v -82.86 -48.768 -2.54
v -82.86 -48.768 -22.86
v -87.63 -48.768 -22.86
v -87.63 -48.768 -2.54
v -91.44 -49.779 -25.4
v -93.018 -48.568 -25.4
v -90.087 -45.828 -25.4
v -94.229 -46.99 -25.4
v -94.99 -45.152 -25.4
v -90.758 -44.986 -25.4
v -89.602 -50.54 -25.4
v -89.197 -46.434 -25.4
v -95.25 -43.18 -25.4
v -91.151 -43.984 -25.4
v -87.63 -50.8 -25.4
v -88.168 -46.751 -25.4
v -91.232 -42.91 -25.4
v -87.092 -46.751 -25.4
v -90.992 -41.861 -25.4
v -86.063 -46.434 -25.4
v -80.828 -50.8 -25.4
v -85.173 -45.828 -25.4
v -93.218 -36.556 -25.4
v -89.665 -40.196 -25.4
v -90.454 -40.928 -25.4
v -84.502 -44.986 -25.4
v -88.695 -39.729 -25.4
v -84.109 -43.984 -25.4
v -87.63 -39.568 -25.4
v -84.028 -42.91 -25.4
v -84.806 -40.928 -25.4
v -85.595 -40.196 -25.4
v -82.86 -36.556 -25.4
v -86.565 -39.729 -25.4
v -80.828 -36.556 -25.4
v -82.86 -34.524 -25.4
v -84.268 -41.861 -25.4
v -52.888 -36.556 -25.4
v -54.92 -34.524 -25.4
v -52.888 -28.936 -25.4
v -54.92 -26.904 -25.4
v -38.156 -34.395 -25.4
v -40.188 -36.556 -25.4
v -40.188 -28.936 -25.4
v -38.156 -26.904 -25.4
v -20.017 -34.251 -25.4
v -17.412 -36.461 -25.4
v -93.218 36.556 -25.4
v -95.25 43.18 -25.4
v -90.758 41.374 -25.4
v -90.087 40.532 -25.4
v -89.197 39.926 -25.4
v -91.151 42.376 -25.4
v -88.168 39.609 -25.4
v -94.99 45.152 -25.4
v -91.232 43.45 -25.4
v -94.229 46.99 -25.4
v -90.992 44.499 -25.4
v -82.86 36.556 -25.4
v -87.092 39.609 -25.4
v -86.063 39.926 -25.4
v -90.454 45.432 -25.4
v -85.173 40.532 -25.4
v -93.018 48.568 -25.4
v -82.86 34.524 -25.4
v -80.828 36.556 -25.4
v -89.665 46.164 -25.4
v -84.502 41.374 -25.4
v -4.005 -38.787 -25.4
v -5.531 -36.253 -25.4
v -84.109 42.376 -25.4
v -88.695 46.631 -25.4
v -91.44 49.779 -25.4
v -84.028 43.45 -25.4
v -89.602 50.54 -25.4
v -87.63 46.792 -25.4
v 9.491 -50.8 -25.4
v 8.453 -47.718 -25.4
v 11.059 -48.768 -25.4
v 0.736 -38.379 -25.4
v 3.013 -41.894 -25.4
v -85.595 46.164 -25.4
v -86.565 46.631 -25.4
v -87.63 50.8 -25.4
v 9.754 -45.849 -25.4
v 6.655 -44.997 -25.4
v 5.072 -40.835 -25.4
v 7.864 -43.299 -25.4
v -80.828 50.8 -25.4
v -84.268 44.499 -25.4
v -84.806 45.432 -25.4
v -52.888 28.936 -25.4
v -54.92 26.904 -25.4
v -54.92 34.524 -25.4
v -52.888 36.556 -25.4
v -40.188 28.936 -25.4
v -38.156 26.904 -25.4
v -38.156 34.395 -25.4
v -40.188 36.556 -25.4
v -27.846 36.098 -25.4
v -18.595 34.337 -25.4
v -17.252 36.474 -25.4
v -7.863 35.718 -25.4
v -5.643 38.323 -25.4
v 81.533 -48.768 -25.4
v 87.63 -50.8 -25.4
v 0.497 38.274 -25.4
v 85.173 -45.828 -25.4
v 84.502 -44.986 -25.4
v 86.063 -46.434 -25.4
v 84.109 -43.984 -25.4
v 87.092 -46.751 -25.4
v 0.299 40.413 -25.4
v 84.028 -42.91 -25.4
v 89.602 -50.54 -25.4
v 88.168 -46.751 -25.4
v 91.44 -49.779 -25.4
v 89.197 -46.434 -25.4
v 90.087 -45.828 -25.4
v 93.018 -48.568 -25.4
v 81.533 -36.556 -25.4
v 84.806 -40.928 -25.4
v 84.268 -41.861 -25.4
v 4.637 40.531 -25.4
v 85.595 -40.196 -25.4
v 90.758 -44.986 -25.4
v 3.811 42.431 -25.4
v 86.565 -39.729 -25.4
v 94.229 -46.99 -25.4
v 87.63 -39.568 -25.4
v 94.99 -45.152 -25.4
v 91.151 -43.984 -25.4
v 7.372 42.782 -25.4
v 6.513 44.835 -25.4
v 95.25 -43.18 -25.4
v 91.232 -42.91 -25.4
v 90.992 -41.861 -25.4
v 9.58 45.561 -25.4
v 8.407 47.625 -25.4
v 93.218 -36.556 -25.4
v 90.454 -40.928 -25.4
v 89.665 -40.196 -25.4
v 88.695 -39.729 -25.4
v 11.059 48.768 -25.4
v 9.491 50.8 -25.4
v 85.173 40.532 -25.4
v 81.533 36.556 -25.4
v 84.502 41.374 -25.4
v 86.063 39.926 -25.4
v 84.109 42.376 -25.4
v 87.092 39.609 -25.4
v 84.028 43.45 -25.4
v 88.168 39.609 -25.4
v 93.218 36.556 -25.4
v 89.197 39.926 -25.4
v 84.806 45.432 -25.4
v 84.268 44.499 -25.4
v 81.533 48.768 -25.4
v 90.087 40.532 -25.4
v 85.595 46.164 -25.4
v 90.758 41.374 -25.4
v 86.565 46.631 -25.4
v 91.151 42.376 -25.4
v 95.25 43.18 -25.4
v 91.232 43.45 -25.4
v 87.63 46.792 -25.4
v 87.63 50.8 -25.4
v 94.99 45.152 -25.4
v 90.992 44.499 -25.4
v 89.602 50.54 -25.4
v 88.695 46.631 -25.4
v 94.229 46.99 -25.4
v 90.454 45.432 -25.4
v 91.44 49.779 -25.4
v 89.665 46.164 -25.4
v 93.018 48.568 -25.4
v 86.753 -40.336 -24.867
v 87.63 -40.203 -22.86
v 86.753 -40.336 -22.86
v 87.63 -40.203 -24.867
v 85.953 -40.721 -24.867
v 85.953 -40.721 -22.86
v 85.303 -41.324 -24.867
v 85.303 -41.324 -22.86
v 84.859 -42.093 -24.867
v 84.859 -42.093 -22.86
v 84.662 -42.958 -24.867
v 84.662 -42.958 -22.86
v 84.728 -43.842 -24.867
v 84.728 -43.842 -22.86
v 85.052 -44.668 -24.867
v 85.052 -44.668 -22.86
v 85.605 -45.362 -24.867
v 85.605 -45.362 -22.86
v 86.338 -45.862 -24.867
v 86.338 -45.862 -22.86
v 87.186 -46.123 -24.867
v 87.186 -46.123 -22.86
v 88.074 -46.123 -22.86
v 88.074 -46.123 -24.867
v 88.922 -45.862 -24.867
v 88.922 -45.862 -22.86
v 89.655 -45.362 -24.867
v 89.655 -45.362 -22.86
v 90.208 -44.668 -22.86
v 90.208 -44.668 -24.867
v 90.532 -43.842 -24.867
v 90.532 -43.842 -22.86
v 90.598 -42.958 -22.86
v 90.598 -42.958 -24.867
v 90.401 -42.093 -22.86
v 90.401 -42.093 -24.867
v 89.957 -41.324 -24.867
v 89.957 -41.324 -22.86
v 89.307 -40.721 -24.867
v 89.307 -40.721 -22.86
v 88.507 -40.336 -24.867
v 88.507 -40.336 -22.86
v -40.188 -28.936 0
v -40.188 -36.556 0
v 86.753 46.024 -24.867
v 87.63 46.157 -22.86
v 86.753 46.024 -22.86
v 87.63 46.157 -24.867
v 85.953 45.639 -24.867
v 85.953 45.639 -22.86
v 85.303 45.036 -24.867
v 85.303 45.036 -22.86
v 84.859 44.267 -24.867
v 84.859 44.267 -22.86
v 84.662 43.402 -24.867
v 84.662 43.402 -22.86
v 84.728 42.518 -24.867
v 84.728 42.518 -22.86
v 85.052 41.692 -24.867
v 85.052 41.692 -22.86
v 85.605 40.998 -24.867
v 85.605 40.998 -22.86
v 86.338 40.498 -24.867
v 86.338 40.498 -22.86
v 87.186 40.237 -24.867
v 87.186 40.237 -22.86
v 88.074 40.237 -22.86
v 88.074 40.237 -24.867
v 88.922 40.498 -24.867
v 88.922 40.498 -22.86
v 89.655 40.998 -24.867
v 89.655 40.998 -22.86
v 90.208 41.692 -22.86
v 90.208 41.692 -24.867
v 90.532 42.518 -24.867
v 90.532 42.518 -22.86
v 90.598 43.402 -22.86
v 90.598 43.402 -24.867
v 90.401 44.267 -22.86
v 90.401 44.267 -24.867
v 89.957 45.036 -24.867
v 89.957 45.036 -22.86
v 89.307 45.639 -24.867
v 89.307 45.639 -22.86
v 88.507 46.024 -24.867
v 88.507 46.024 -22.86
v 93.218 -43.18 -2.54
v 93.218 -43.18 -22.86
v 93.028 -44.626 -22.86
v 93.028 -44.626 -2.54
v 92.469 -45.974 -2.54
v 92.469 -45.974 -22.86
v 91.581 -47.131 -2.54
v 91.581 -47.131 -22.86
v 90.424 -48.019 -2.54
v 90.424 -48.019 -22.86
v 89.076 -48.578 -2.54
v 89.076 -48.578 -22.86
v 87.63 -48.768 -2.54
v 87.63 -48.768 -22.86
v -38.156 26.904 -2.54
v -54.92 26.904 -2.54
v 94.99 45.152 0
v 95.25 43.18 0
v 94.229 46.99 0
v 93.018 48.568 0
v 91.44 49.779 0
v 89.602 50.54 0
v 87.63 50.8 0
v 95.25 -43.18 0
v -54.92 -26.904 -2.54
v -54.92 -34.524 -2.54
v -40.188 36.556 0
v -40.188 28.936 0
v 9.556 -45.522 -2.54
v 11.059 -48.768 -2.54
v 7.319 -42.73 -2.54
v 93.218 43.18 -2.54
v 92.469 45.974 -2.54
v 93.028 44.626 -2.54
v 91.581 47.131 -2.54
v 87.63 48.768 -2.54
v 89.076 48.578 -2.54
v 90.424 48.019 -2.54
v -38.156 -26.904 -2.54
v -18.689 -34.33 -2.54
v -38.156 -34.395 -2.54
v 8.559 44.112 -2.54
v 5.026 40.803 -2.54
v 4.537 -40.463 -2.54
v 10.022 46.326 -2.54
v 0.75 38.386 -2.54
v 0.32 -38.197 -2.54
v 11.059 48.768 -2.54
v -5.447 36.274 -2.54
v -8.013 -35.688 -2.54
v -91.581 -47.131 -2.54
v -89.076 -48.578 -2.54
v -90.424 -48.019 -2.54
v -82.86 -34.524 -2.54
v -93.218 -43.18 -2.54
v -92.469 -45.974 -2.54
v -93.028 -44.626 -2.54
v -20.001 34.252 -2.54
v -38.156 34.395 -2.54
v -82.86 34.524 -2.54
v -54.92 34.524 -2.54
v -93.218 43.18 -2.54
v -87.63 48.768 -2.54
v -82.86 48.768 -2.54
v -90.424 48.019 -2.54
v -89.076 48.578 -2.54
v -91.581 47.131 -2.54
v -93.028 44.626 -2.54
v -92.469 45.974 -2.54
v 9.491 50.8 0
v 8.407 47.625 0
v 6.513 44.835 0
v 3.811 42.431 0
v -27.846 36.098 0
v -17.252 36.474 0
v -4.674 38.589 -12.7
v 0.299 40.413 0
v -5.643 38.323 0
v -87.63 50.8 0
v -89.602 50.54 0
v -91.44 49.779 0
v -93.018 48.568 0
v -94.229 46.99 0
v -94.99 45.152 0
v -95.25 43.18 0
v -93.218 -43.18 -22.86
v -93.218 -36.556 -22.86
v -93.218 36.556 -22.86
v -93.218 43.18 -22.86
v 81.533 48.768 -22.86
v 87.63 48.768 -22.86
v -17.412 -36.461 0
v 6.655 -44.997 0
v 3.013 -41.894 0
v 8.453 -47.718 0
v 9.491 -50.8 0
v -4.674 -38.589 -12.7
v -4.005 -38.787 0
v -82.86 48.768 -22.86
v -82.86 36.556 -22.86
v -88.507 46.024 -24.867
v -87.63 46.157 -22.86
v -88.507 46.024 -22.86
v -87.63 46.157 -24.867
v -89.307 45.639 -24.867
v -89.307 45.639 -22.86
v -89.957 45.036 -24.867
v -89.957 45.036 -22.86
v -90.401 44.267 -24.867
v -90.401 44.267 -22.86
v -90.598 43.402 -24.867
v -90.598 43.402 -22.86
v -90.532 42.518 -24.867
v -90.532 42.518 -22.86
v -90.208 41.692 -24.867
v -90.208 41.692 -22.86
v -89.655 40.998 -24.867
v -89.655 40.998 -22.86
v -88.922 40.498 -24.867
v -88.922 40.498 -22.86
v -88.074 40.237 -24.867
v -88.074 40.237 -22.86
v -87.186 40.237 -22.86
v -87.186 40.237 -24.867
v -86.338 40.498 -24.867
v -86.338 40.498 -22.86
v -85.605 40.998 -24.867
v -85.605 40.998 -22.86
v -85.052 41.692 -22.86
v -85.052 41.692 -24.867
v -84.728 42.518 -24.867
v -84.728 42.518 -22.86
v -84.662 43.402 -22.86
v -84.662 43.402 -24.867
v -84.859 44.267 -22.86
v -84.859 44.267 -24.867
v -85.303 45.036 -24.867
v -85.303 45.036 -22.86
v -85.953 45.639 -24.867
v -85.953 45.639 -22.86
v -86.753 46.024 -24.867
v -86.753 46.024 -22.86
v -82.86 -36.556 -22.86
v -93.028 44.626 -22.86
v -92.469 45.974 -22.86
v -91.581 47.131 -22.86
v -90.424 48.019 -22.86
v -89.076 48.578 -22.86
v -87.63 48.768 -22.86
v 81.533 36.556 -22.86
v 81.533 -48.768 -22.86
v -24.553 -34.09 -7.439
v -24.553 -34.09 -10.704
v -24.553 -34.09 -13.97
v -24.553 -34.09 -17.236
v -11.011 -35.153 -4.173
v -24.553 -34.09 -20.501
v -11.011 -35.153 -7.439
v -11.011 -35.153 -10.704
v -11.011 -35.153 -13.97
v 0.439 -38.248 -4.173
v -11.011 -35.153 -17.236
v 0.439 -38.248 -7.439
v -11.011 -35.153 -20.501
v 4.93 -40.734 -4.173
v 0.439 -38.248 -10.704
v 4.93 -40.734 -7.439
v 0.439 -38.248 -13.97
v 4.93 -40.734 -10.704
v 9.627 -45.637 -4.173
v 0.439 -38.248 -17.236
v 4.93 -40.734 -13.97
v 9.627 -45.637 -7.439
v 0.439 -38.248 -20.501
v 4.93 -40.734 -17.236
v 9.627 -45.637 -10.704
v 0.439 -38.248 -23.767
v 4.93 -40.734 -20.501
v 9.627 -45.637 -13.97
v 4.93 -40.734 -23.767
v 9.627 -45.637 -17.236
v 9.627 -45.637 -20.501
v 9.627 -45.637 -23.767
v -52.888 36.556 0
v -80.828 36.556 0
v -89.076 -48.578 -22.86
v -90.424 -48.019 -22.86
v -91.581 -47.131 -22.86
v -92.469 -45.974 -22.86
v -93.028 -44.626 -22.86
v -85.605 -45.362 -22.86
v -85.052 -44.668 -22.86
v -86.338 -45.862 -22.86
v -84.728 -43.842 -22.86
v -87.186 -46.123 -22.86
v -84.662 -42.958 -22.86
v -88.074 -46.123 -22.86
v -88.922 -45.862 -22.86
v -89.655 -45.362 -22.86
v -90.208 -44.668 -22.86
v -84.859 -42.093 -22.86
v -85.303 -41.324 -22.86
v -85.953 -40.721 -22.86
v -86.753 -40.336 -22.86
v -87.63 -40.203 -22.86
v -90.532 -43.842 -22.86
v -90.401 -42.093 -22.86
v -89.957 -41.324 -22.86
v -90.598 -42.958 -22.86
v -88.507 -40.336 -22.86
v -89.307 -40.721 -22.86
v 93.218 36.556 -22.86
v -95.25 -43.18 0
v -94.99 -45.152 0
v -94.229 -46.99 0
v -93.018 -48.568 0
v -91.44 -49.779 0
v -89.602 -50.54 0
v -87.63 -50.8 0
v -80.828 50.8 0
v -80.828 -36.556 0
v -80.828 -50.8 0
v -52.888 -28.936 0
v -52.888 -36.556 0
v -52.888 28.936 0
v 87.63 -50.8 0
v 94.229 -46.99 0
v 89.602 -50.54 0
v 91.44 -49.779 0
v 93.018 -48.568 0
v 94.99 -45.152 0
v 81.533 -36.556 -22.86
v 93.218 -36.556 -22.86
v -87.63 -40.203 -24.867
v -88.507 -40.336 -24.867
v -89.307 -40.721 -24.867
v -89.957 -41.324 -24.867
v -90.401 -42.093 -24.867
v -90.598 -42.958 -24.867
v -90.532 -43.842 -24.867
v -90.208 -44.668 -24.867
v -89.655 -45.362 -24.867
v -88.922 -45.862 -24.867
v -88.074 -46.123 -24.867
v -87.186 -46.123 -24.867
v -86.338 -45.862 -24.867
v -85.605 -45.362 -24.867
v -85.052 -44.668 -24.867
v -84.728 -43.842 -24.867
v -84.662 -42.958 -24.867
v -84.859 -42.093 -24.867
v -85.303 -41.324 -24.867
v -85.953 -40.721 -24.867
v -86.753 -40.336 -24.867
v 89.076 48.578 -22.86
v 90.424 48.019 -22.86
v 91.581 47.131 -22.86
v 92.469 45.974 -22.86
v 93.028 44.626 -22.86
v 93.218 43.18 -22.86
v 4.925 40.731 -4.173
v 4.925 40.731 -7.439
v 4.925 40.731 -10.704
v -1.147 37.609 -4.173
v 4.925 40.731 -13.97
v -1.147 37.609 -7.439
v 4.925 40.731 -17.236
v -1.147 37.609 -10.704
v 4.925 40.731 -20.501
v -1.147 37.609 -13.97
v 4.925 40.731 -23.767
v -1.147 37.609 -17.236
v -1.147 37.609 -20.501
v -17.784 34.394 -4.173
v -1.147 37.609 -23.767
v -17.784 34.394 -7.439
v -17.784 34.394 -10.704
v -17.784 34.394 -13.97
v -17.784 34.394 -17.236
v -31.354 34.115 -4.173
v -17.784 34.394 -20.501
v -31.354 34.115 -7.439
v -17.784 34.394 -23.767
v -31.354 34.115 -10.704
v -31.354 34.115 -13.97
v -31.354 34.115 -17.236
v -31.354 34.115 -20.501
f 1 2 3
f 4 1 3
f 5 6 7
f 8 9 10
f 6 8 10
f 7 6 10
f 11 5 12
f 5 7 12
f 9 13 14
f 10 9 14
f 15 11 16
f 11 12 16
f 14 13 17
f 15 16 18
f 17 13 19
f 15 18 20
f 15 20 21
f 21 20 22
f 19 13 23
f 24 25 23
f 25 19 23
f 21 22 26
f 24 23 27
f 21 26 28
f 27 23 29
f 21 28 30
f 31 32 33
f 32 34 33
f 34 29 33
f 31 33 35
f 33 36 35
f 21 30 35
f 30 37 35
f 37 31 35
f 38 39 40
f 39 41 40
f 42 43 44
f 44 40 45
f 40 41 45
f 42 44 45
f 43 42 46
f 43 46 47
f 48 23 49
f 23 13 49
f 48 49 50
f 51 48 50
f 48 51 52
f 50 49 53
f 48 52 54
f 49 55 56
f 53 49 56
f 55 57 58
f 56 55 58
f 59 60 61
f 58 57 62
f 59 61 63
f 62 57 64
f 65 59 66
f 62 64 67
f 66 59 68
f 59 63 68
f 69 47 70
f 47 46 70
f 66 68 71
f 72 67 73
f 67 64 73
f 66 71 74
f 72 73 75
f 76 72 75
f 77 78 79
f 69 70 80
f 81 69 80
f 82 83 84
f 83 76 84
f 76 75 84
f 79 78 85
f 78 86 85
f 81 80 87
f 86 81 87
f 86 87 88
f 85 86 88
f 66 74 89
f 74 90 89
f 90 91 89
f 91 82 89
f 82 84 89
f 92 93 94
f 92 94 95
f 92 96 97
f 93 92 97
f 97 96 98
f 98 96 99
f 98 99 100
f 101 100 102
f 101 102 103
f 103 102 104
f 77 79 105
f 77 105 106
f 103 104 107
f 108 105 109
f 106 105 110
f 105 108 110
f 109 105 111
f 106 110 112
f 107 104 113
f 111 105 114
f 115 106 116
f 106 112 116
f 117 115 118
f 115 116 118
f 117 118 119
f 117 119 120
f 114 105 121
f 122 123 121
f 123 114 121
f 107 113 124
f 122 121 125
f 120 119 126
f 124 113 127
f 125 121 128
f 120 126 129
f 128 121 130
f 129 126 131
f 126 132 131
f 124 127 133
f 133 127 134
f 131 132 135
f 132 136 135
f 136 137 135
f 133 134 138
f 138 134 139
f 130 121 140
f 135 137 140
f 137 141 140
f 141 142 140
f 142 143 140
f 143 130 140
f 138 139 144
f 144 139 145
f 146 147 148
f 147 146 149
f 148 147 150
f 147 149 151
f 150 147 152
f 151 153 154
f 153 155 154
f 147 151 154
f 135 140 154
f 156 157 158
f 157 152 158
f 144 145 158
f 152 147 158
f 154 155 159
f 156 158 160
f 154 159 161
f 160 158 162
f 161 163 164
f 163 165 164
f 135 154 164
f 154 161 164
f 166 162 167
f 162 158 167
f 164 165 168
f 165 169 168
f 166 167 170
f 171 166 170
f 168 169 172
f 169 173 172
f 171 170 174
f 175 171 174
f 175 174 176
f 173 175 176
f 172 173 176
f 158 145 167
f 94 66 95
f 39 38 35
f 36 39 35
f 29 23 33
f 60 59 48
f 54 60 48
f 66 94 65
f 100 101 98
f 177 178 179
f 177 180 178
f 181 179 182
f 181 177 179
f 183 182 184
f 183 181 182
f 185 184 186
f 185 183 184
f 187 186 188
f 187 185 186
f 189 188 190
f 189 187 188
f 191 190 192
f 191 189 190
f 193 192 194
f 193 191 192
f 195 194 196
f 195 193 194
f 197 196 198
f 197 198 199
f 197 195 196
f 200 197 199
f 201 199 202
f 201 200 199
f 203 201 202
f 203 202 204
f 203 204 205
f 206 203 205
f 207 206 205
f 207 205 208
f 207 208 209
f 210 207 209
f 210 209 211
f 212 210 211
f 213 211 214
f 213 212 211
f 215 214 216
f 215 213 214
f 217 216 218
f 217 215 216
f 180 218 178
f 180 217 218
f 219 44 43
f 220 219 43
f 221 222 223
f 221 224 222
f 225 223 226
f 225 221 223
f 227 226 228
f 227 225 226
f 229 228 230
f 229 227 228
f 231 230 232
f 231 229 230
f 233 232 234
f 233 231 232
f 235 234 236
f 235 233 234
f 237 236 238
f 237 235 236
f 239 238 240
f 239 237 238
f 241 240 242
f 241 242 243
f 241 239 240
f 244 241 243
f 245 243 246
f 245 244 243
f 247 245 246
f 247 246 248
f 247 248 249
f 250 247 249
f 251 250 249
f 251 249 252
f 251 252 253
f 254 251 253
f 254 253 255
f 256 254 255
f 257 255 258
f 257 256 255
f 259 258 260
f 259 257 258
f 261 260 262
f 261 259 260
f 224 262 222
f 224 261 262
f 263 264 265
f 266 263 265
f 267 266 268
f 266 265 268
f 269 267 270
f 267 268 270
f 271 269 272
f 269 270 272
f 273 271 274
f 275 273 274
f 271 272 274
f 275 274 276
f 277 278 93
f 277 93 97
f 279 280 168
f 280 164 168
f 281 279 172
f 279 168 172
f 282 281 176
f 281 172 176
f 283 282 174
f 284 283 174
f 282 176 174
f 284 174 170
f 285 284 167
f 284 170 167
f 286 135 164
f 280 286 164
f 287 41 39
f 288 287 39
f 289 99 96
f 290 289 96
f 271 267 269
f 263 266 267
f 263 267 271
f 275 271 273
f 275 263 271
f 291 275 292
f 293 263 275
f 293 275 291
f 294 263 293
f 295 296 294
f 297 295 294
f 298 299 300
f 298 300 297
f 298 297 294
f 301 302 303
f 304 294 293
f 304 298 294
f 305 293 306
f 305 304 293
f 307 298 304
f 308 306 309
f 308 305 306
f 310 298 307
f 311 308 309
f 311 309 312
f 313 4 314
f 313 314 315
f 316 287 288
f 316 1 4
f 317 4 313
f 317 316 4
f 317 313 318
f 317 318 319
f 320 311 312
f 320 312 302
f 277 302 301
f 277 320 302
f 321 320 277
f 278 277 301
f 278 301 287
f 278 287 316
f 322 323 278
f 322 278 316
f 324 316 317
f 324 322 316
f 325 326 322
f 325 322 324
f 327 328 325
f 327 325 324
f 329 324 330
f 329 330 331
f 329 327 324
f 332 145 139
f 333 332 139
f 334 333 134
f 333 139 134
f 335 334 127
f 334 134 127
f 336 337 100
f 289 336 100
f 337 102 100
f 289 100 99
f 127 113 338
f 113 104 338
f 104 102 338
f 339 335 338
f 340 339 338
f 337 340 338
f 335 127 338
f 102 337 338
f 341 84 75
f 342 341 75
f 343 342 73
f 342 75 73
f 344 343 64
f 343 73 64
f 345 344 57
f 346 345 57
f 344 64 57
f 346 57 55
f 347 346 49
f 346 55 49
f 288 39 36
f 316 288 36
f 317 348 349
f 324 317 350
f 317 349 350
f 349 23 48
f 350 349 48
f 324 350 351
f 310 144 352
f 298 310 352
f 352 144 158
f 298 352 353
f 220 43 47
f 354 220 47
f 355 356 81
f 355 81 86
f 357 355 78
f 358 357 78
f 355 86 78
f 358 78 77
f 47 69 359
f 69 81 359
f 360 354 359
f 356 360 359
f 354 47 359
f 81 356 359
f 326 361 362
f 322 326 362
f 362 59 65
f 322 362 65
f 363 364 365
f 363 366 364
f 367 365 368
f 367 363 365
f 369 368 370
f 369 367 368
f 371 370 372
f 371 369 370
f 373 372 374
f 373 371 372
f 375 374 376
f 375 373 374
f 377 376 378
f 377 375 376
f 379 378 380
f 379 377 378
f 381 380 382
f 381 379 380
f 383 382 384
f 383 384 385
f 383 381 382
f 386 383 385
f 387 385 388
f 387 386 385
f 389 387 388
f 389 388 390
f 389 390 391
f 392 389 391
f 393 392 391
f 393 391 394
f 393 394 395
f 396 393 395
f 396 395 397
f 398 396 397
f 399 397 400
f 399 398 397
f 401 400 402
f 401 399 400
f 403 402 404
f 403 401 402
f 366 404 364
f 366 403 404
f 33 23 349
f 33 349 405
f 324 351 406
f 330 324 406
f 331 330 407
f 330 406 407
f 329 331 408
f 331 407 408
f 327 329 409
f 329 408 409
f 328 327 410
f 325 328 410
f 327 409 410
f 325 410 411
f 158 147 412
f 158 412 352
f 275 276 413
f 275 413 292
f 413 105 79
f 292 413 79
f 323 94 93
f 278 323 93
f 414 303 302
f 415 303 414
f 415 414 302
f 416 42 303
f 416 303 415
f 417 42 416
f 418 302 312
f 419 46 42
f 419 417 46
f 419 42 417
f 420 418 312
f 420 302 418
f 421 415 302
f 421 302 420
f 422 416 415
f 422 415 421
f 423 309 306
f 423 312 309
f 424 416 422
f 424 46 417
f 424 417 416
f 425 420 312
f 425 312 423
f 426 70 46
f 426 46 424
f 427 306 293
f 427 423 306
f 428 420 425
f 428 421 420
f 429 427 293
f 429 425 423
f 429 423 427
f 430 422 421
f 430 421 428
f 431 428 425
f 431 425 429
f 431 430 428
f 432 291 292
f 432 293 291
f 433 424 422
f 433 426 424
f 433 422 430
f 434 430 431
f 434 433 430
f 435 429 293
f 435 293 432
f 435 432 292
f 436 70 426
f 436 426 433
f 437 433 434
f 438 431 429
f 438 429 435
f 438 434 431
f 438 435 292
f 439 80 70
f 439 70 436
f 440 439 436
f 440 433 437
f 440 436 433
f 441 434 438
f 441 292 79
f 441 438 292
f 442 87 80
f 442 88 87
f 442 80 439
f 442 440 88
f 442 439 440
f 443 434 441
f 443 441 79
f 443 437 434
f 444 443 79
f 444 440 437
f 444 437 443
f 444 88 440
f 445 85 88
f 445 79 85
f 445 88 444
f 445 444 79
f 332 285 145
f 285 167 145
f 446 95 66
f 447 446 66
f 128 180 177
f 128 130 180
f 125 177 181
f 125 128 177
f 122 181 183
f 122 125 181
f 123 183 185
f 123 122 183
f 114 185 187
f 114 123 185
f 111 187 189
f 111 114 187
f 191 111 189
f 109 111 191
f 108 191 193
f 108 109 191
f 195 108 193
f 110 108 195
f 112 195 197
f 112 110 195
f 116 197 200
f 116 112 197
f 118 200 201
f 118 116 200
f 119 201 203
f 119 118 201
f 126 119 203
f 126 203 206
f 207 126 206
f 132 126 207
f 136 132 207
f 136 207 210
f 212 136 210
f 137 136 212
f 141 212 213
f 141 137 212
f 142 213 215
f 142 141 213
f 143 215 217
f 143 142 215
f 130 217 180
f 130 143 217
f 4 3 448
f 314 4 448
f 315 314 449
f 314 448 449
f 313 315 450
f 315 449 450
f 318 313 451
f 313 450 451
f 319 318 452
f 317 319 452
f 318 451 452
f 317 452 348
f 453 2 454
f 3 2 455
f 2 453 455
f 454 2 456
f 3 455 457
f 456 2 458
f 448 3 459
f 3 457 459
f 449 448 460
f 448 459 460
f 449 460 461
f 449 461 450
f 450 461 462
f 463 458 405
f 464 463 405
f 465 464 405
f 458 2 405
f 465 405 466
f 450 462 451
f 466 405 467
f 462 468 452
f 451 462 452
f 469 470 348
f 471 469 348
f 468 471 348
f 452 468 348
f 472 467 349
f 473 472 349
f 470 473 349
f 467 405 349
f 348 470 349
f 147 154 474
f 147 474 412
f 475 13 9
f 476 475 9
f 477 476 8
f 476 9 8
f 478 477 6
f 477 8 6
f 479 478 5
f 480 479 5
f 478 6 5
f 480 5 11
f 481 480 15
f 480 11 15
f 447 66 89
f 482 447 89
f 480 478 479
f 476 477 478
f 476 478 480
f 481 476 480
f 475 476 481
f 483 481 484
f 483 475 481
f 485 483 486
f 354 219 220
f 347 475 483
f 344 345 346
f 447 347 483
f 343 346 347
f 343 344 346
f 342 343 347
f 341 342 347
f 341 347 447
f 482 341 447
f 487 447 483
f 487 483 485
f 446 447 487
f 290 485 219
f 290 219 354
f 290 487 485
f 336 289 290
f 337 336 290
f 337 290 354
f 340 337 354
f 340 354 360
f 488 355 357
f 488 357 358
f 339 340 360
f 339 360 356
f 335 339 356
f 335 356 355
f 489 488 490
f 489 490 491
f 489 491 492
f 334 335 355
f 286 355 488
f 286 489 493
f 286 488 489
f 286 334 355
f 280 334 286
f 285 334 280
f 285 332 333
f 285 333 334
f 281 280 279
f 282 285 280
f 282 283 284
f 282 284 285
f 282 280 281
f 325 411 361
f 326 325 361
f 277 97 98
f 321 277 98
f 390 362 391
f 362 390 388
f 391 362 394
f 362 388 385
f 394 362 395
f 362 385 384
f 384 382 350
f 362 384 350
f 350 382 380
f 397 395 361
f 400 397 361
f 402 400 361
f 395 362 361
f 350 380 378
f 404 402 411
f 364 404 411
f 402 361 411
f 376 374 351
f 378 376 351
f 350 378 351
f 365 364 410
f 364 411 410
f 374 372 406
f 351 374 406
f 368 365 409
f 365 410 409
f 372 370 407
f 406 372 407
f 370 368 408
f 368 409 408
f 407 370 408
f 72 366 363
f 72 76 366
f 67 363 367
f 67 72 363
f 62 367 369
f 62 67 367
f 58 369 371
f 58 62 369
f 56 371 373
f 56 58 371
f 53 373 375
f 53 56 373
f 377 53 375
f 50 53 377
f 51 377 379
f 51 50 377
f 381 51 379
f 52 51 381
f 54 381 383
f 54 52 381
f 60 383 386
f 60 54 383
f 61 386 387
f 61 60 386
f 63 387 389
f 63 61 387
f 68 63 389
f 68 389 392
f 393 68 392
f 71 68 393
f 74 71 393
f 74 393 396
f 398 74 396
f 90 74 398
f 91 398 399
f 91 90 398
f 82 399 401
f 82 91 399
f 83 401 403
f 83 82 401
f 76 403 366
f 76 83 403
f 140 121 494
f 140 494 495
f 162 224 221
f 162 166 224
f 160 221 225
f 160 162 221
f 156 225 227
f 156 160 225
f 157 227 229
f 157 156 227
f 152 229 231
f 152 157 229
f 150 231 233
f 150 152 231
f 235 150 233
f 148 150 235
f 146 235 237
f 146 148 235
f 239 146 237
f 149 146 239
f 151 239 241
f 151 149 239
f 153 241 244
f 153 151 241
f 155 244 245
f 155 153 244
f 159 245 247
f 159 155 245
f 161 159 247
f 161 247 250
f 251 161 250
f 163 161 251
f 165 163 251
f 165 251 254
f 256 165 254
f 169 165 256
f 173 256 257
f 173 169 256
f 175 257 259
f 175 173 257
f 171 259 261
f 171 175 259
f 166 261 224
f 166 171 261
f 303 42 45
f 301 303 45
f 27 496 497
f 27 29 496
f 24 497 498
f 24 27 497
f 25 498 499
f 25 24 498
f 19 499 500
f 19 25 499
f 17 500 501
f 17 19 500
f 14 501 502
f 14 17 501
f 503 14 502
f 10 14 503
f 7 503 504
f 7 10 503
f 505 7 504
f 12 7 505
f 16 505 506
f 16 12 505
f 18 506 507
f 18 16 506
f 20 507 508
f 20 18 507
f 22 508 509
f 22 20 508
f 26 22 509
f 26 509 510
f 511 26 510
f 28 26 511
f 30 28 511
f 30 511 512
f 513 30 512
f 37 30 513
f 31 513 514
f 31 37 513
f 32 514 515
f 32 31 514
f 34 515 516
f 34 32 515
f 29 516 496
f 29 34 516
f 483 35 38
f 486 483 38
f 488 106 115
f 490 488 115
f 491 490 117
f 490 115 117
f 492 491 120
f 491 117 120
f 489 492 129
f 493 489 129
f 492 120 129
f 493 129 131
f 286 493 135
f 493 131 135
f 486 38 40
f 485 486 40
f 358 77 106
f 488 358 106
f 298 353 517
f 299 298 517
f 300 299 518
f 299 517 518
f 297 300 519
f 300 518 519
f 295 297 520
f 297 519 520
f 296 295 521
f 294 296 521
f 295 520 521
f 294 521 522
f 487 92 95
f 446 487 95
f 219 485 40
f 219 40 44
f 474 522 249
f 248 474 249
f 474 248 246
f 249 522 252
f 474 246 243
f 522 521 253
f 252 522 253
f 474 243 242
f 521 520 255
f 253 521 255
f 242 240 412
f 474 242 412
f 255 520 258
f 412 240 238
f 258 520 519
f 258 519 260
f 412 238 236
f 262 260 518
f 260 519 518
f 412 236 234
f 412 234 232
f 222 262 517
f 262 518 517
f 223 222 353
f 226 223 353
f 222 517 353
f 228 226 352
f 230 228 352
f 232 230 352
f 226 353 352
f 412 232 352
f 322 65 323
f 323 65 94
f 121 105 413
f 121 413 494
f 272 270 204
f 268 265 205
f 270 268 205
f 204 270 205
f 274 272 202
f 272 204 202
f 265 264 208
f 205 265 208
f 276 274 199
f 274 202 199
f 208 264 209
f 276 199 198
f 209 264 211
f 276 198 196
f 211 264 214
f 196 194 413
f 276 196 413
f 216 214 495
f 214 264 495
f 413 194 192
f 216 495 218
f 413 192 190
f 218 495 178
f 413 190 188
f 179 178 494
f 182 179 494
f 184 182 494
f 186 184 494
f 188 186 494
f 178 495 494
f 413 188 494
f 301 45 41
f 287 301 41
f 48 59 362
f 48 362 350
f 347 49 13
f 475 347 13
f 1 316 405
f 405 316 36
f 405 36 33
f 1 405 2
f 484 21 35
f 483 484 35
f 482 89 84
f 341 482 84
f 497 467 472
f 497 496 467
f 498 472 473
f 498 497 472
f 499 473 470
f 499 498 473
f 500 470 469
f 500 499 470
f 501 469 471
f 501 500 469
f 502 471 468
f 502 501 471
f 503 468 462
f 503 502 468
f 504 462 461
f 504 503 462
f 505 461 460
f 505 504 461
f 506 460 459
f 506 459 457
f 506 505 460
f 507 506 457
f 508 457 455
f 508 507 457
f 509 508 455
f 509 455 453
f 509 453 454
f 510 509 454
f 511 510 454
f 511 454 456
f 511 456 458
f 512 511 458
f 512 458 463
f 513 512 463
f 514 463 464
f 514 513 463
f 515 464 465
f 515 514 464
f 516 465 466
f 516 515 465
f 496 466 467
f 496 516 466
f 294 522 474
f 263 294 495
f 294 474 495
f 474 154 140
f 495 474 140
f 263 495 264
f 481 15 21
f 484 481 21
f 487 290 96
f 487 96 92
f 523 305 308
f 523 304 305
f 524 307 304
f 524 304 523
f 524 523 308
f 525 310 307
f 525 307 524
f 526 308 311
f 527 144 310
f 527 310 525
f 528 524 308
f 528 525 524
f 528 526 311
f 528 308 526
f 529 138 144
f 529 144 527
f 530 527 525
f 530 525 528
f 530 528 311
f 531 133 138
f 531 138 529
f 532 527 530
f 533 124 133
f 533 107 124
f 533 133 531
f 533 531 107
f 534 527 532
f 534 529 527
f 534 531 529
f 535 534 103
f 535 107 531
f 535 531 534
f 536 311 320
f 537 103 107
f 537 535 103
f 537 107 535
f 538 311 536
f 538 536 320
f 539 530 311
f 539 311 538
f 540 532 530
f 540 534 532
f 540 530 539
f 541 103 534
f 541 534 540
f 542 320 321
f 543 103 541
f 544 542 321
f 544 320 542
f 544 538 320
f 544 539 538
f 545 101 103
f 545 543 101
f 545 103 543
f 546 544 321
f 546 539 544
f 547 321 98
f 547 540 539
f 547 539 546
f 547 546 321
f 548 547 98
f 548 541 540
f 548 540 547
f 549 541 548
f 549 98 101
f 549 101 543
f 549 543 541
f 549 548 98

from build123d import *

# Parameters (mm, degrees)
EXTRUDE_THIN2_START                       = -25.4
EXTRUDE_THIN2_DEPTH                       = 25.4
BOSS_EXTRUDE1_START                       = -2.54
BOSS_EXTRUDE1_DEPTH                       = 2.54
BOSS_EXTRUDE2_DEPTH                       = 2.54
F_15_64_0_23438_DIAMETER_HOLE1_AT_2_COUNT = 2
F_15_64_0_23438_DIAMETER_HOLE1_AT_2_PITCH = 86.36
F_15_64_0_23438_DIAMETER_HOLE1_AT_3_COUNT = 2
F_15_64_0_23438_DIAMETER_HOLE1_AT_3_PITCH = 195.381977675
F_15_64_0_23438_DIAMETER_HOLE1_AT_4_COUNT = 2
F_15_64_0_23438_DIAMETER_HOLE1_AT_4_PITCH = 175.26


# Read off the part's stored shape, not the designer's step: Extrude-Thin2
with BuildPart() as part:
    # Extrude-Thin2 outline → Extrude-Thin2 (new body)
    with BuildSketch(Plane.XY.offset(EXTRUDE_THIN2_START)):
        with BuildLine():
            Line((-80.828024073, 36.556311377), (-80.828024073, 50.8))
            Line((-80.828024073, 50.8), (-87.63, 50.8))
            ThreePointArc((-87.63, 50.8), (-93.018153673, 48.568153673), (-95.25, 43.18))
            Line((-95.25, 43.18), (-95.25, -43.18))
            ThreePointArc((-95.25, -43.18), (-93.018153673, -48.568153673), (-87.63, -50.8))
            Line((-87.63, -50.8), (-80.828024073, -50.8))
            Line((-80.828024073, -50.8), (-80.828024073, -36.556311377))
            Line((-80.828024073, -36.556311377), (-52.888024073, -36.556311377))
            Line((-52.888024073, -36.556311377), (-52.888024073, -28.936311377))
            Line((-52.888024073, -28.936311377), (-40.188024073, -28.936311377))
            Line((-40.188024073, -28.936311377), (-40.188024073, -36.556311377))
            add(Edge.make_bspline(
                [(-40.188024073, -36.556311377), (6.000491779, -33.499243365), (9.490782471, -50.8)],
                knots=[0, 0, 0, 0.610951086, 0.610951086, 0.610951086], degree=2))
            Line((9.490782471, -50.8), (87.63, -50.8))
            ThreePointArc((87.63, -50.8), (93.018153673, -48.568153673), (95.25, -43.18))
            Line((95.25, -43.18), (95.25, 43.18))
            ThreePointArc((95.25, 43.18), (93.018153673, 48.568153673), (87.63, 50.8))
            Line((87.63, 50.8), (9.490782471, 50.8))
            add(Edge.make_bspline(
                [(9.490782471, 50.8), (6.000491779, 33.499243365), (-40.188024073, 36.556311377)],
                knots=[0, 0, 0, 0.610951086, 0.610951086, 0.610951086], degree=2))
            Line((-40.188024073, 36.556311377), (-40.188024073, 28.936311377))
            Line((-40.188024073, 28.936311377), (-52.888024073, 28.936311377))
            Line((-52.888024073, 28.936311377), (-52.888024073, 36.556311377))
            Line((-52.888024073, 36.556311377), (-80.828024073, 36.556311377))
        make_face()
        with BuildLine():
            Line((-87.63, 48.768), (-82.860024073, 48.768))
            Line((-82.860024073, 48.768), (-82.860024073, 34.524311377))
            Line((-82.860024073, 34.524311377), (-54.920024073, 34.524311377))
            Line((-54.920024073, 34.524311377), (-54.920024073, 26.904311377))
            Line((-54.920024073, 26.904311377), (-38.156024073, 26.904311377))
            Line((-38.156024073, 26.904311377), (-38.156024073, 34.395144422))
            add(Edge.make_bspline(
                [(11.059099877, 48.768), (10.705913599, 47.666821526), (10.231462505, 46.631478385), (9.34485534, 45.173434414), (9.020114118, 44.703275583), (8.31285443, 43.794325504), (7.932752955, 43.359154617), (6.738556789, 42.126829372), (5.863761314, 41.393125544), (4.455909096, 40.399393999), (3.970643089, 40.086351658), (2.987111557, 39.50137004), (2.48684241, 39.227961499), (0.964119528, 38.456915884), (-0.080085669, 38.008090834), (-1.679731191, 37.409665787), (-2.218549861, 37.222765467), (-3.306137501, 36.871294096), (-3.856031524, 36.7064305), (-6.610131831, 35.936843126), (-8.830751105, 35.489873067), (-13.293085078, 34.801180583), (-15.535017784, 34.561579267), (-20.033665755, 34.226203327), (-22.290452983, 34.13112888), (-26.815059954, 34.048320676), (-29.084850225, 34.060938072), (-33.62255889, 34.169687173), (-35.889894754, 34.26582406), (-38.156024073, 34.395144422)],
                knots=[0, 0, 0, 0, 0.0625, 0.0625, 0.09375, 0.09375, 0.125, 0.125, 0.1875, 0.1875, 0.21875, 0.21875, 0.25, 0.25, 0.3125, 0.3125, 0.34375, 0.34375, 0.375, 0.375, 0.5, 0.5, 0.625, 0.625, 0.75, 0.75, 0.875, 0.875, 1, 1, 1, 1], degree=3))
            Line((11.059099877, 48.768), (87.63, 48.768))
            ThreePointArc((87.63, 48.768), (91.581312693, 47.131312693), (93.218, 43.18))
            Line((93.218, 43.18), (93.218, -43.18))
            ThreePointArc((93.218, -43.18), (91.581312693, -47.131312693), (87.63, -48.768))
            Line((87.63, -48.768), (11.059099877, -48.768))
            add(Edge.make_bspline(
                [(-38.156024073, -34.395144422), (-35.889212951, -34.265785152), (-33.622237618, -34.169696181), (-29.087874945, -34.060993864), (-26.820488385, -34.048222574), (-23.419006743, -34.110473753), (-22.285112177, -34.144870035), (-20.017166217, -34.245437307), (-18.881979516, -34.311696432), (-15.488251882, -34.56581331), (-13.239736034, -34.807790371), (-8.782595463, -35.498966347), (-6.573640775, -35.946451198), (-3.306890482, -36.860175418), (-2.225854522, -37.205688462), (-0.62007844, -37.805919033), (-0.086320204, -38.02031336), (0.963955056, -38.476496538), (1.481482977, -38.71859586), (3.008182433, -39.492540914), (3.991806837, -40.071413071), (5.399027077, -41.06529203), (5.854721193, -41.41662922), (6.723566444, -42.153236805), (7.138582961, -42.539781101), (8.320387349, -43.758860403), (9.024746312, -44.65099332), (10.229082778, -46.623668325), (10.706098691, -47.667398611), (11.059099877, -48.768)],
                knots=[0, 0, 0, 0, 0.125, 0.125, 0.25, 0.25, 0.3125, 0.3125, 0.375, 0.375, 0.5, 0.5, 0.625, 0.625, 0.6875, 0.6875, 0.71875, 0.71875, 0.75, 0.75, 0.8125, 0.8125, 0.84375, 0.84375, 0.875, 0.875, 0.9375, 0.9375, 1, 1, 1, 1], degree=3))
            Line((-38.156024073, -34.395144422), (-38.156024073, -26.904311377))
            Line((-38.156024073, -26.904311377), (-54.920024073, -26.904311377))
            Line((-54.920024073, -26.904311377), (-54.920024073, -34.524311377))
            Line((-54.920024073, -34.524311377), (-82.860024073, -34.524311377))
            Line((-82.860024073, -34.524311377), (-82.860024073, -48.768))
            Line((-82.860024073, -48.768), (-87.63, -48.768))
            ThreePointArc((-87.63, -48.768), (-91.581312693, -47.131312693), (-93.218, -43.18))
            Line((-93.218, -43.18), (-93.218, 43.18))
            ThreePointArc((-93.218, 43.18), (-91.581312693, 47.131312693), (-87.63, 48.768))
        make_face(mode=Mode.SUBTRACT)
    extrude(amount=EXTRUDE_THIN2_DEPTH)

    # Sketch11<2> → Boss-Extrude1 (add)
    with BuildSketch(Plane.XY.offset(BOSS_EXTRUDE1_START)):
        with BuildLine():
            Line((-80.828024073, 50.8), (-80.828024073, 36.556311377))
            Line((-80.828024073, 36.556311377), (-52.888024073, 36.556311377))
            Line((-52.888024073, 36.556311377), (-52.888024073, 28.936311377))
            Line((-52.888024073, 28.936311377), (-40.188024073, 28.936311377))
            Line((-40.188024073, 28.936311377), (-40.188024073, 36.556311377))
            add(Edge.make_bspline(
                [(-40.188024073, 36.556311377), (6.000491779, 33.499243365), (9.490782471, 50.8)],
                knots=[0, 0, 0, 0.610951086, 0.610951086, 0.610951086], degree=2))
            Line((9.490782471, 50.8), (87.63, 50.8))
            ThreePointArc((87.63, 50.8), (93.018153673, 48.568153673), (95.25, 43.18))
            Line((95.25, 43.18), (95.25, -43.18))
            ThreePointArc((95.25, -43.18), (93.018153673, -48.568153673), (87.63, -50.8))
            Line((87.63, -50.8), (9.490782471, -50.8))
            add(Edge.make_bspline(
                [(-40.188024073, -36.556311377), (6.000491779, -33.499243365), (9.490782471, -50.8)],
                knots=[0, 0, 0, 0.610951086, 0.610951086, 0.610951086], degree=2))
            Line((-40.188024073, -36.556311377), (-40.188024073, -28.936311377))
            Line((-40.188024073, -28.936311377), (-52.888024073, -28.936311377))
            Line((-52.888024073, -28.936311377), (-52.888024073, -36.556311377))
            Line((-52.888024073, -36.556311377), (-80.828024073, -36.556311377))
            Line((-80.828024073, -36.556311377), (-80.828024073, -50.8))
            Line((-80.828024073, -50.8), (-87.63, -50.8))
            ThreePointArc((-87.63, -50.8), (-93.018153673, -48.568153673), (-95.25, -43.18))
            Line((-95.25, -43.18), (-95.25, 43.18))
            ThreePointArc((-95.25, 43.18), (-93.018153673, 48.568153673), (-87.63, 50.8))
            Line((-87.63, 50.8), (-80.828024073, 50.8))
        make_face()
    extrude(amount=BOSS_EXTRUDE1_DEPTH)

    # Sketch14 → Boss-Extrude2 (add)
    with BuildSketch(Plane(origin=(0, 0, -25.4), x_dir=(-1, 0, 0), z_dir=(0, 0, -1))):
        with BuildLine():
            ThreePointArc((-95.25, -43.18), (-93.018153673, -48.568153673), (-87.63, -50.8))
            Line((-87.63, -50.8), (-81.532541243, -50.8))
            Line((-81.532541243, -50.8), (-81.532541243, -36.556311377))
            Line((-81.532541243, -36.556311377), (-95.25, -36.556311377))
            Line((-95.25, -36.556311377), (-95.25, -43.18))
        make_face()
        with BuildLine():
            Line((-95.25, 43.18), (-95.25, 36.556311377))
            Line((-95.25, 36.556311377), (-81.532541243, 36.556311377))
            Line((-81.532541243, 36.556311377), (-81.532541243, 50.8))
            Line((-81.532541243, 50.8), (-87.63, 50.8))
            ThreePointArc((-87.63, 50.8), (-93.018153673, 48.568153673), (-95.25, 43.18))
        make_face()
        with BuildLine():
            Line((95.25, -43.18), (95.25, -36.556311377))
            Line((95.25, -36.556311377), (80.828024073, -36.556311377))
            Line((80.828024073, -36.556311377), (80.828024073, -50.8))
            Line((80.828024073, -50.8), (87.63, -50.8))
            ThreePointArc((87.63, -50.8), (93.018153673, -48.568153673), (95.25, -43.18))
        make_face()
        with BuildLine():
            Line((87.63, 50.8), (80.828024073, 50.8))
            Line((80.828024073, 50.8), (80.828024073, 36.556311377))
            Line((80.828024073, 36.556311377), (95.25, 36.556311377))
            Line((95.25, 36.556311377), (95.25, 43.18))
            ThreePointArc((95.25, 43.18), (93.018153673, 48.568153673), (87.63, 50.8))
        make_face()
    extrude(amount=-BOSS_EXTRUDE2_DEPTH)

    # Sketch15 → 15/64 (0.23438) Diameter Hole1 (revolve, cut)
    with BuildSketch(Plane(origin=(87.63, 43.18, -25.4), x_dir=(0, 1, 0), z_dir=(1, 0, 0))):
        Polygon((0, 0), (0, 2.54), (2.976626, 2.54), (2.976626, 0.532828266), (3.611626, 0), align=None)
    f_15_64_0_23438_diameter_hole1 = revolve(axis=Axis((87.63, 43.18, -31.75), (0, 0, 1)), mode=Mode.SUBTRACT)

    # 15/64 (0.23438) Diameter Hole1 at 2: 15/64 (0.23438) Diameter Hole1 ×2
    with Locations(*[(0, -i * F_15_64_0_23438_DIAMETER_HOLE1_AT_2_PITCH, 0) for i in range(1, F_15_64_0_23438_DIAMETER_HOLE1_AT_2_COUNT)]):
        add(f_15_64_0_23438_diameter_hole1, mode=Mode.SUBTRACT)

    # 15/64 (0.23438) Diameter Hole1 at 3: 15/64 (0.23438) Diameter Hole1 ×2
    with Locations(*[Vector(-0.8970121097452229, -0.44200596712083456, 0) * (i * F_15_64_0_23438_DIAMETER_HOLE1_AT_3_PITCH) for i in range(1, F_15_64_0_23438_DIAMETER_HOLE1_AT_3_COUNT)]):
        add(f_15_64_0_23438_diameter_hole1, mode=Mode.SUBTRACT)

    # 15/64 (0.23438) Diameter Hole1 at 4: 15/64 (0.23438) Diameter Hole1 ×2
    with Locations(*[(-i * F_15_64_0_23438_DIAMETER_HOLE1_AT_4_PITCH, 0, 0) for i in range(1, F_15_64_0_23438_DIAMETER_HOLE1_AT_4_COUNT)]):
        add(f_15_64_0_23438_diameter_hole1, mode=Mode.SUBTRACT)


solid = part.part
